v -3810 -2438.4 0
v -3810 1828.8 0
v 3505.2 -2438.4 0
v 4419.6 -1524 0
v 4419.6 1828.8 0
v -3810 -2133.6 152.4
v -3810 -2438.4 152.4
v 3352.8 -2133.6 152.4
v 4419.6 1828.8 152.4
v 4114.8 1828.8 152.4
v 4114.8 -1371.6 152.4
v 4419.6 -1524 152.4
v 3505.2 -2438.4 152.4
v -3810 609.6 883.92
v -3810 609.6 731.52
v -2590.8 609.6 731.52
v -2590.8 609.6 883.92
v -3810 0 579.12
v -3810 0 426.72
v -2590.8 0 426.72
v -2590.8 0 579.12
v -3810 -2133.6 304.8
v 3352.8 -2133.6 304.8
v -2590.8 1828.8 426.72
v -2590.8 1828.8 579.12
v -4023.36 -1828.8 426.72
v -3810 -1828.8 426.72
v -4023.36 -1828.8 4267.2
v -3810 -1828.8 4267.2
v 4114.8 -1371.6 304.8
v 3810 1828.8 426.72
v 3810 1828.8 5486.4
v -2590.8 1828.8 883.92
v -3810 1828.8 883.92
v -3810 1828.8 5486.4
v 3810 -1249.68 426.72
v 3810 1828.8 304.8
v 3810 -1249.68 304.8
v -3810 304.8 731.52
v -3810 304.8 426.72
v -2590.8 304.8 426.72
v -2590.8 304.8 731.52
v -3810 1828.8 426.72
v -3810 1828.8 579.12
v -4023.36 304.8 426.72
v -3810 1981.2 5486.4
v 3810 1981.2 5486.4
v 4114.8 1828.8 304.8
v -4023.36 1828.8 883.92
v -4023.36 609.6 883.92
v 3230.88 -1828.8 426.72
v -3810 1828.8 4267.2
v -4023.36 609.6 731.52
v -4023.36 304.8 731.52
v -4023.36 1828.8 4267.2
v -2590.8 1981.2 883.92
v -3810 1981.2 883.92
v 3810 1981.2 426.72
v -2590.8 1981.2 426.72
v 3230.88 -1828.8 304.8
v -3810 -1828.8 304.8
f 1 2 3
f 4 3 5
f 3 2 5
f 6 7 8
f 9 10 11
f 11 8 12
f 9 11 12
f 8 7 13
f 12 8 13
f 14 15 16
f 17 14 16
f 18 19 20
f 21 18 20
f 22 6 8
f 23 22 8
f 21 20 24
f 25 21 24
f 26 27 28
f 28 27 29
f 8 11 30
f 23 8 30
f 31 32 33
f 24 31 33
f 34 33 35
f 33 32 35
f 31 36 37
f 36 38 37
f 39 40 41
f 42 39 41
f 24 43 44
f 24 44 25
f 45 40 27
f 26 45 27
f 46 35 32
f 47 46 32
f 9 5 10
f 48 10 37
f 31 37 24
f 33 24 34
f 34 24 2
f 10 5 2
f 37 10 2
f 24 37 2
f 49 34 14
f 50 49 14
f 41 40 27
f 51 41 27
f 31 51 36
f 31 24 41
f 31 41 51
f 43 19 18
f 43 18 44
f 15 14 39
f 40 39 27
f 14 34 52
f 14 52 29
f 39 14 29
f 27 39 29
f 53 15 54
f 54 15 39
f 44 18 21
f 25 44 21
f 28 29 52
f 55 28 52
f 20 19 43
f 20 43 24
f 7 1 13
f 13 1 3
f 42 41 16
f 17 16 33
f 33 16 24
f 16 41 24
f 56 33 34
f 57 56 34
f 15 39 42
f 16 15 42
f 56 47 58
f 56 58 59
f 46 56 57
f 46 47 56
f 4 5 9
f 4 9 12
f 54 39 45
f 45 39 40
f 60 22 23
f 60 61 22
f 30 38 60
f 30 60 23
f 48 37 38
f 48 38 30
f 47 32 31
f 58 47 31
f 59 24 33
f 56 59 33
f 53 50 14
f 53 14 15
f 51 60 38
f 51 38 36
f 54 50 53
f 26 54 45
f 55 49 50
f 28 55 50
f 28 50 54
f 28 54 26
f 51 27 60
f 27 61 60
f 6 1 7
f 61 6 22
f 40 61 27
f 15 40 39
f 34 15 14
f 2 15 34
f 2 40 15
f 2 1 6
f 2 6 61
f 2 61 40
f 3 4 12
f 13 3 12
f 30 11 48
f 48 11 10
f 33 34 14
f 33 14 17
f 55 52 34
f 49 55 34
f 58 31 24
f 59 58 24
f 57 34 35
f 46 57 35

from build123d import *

# Parameters (mm, degrees)
F0_W      = 7620
F0_H      = 3657.6
F1_DEPTH  = 426.72
F2_W      = 8229.6
F2_H      = 4267.2
F3_DEPTH  = 152.4
F4_DEPTH  = 152.4
F5_W      = 1219.2
F5_H      = 1219.2
F6_DEPTH  = 457.2
F7_W      = 1219.2
F7_H      = 1524
F8_DEPTH  = 731.52
F10_DEPTH = 152.4
F12_DEPTH = 213.36
F14_DEPTH = 152.4
F15_SIZE  = 579.12
F16_SIZE  = 762
F17_W     = 1219.2
F17_H     = 1828.8
F18_DEPTH = 152.4
F19_SIZE  = 914.4


with BuildPart() as f1:
    # F0 (on Top) → F1 (new body)
    with BuildSketch(Plane.XY):
        Rectangle(F0_W, F0_H)
    extrude(amount=F1_DEPTH)

    # F2 (on face) → F3 (join)
    with BuildSketch(Plane(origin=(0, 0, 0), x_dir=(1, 0, 0), z_dir=(0, 0, -1))):
        with Locations((304.8, 304.8)):
            Rectangle(F2_W, F2_H)
    extrude(amount=-F3_DEPTH)

    # F2 (on face) → F4 (join)
    with BuildSketch(Plane(origin=(0, 0, 0), x_dir=(1, 0, 0), z_dir=(0, 0, -1))):
        Polygon((3810, 1828.8), (3810, -1828.8), (4419.6, -1828.8), (4419.6, 2438.4), (-3810, 2438.4), (-3810, 1828.8), align=None)
    extrude(amount=-F4_DEPTH)

    # F5 (on face) → F6 (join)
    with BuildSketch(Plane.XY.offset(426.72)):
        with Locations((-3200.4, 1219.2)):
            Rectangle(F5_W, F5_H)
    extrude(amount=F6_DEPTH)

    # F7 (on face) → F8 (join)
    with BuildSketch(Plane(origin=(0, 0, 0), x_dir=(1, 0, 0), z_dir=(0, 0, -1))):
        with Locations((-3200.4, -1066.8)):
            Rectangle(F7_W, F7_H)
    extrude(amount=-F8_DEPTH)

    # F13 (on face) → F14 (join)
    with BuildSketch(Plane.XY.offset(152.4)):
        Polygon((4114.8, 1828.8), (-3810, 1828.8), (-3810, -1828.8), (-3810, -2133.6), (4114.8, -2133.6), align=None)
    extrude(amount=F14_DEPTH)

    # F15
    f15_edges = [f1.edges().sort_by_distance(p)[0] for p in [
        (3810, -1828.8, 365.76),
    ]]
    chamfer(f15_edges, length=F15_SIZE)

    # F16
    f16_edges = [f1.edges().sort_by_distance(p)[0] for p in [
        (4114.8, -2133.6, 228.6),
    ]]
    chamfer(f16_edges, length=F16_SIZE)

    # F19
    f19_edges = [f1.edges().sort_by_distance(p)[0] for p in [
        (4419.6, -2438.4, 76.2),
    ]]
    chamfer(f19_edges, length=F19_SIZE)


with BuildPart() as f10:
    # F9 (on face) → F10 (new body)
    with BuildSketch(Plane(origin=(0, 1828.8, 0), x_dir=(-1, 0, 0), z_dir=(0, 1, 0))):
        Polygon((2590.8, 883.92), (3810, 883.92), (3810, 5486.4), (-3810, 5486.4), (-3810, 426.72), (2590.8, 426.72), align=None)
    extrude(amount=F10_DEPTH)


with BuildPart() as f12:
    # F11 (on face) → F12 (new body)
    with BuildSketch(Plane(origin=(-3810, 0, 0), x_dir=(0, -1, 0), z_dir=(-1, 0, 0))):
        Polygon((-1828.8, 4267.2), (-1828.8, 883.92), (-609.6, 883.92), (-609.6, 731.52), (-304.8, 731.52), (-304.8, 426.72), (1828.8, 426.72), (1828.8, 4267.2), align=None)
    extrude(amount=F12_DEPTH)


with BuildPart() as f18:
    # F17 (on face) → F18 (new body)
    with BuildSketch(Plane.XY.offset(426.72)):
        with Locations((-3200.4, 914.4)):
            Rectangle(F17_W, F17_H)
    extrude(amount=F18_DEPTH)


solid = Compound([f1.part, f10.part, f12.part, f18.part])
